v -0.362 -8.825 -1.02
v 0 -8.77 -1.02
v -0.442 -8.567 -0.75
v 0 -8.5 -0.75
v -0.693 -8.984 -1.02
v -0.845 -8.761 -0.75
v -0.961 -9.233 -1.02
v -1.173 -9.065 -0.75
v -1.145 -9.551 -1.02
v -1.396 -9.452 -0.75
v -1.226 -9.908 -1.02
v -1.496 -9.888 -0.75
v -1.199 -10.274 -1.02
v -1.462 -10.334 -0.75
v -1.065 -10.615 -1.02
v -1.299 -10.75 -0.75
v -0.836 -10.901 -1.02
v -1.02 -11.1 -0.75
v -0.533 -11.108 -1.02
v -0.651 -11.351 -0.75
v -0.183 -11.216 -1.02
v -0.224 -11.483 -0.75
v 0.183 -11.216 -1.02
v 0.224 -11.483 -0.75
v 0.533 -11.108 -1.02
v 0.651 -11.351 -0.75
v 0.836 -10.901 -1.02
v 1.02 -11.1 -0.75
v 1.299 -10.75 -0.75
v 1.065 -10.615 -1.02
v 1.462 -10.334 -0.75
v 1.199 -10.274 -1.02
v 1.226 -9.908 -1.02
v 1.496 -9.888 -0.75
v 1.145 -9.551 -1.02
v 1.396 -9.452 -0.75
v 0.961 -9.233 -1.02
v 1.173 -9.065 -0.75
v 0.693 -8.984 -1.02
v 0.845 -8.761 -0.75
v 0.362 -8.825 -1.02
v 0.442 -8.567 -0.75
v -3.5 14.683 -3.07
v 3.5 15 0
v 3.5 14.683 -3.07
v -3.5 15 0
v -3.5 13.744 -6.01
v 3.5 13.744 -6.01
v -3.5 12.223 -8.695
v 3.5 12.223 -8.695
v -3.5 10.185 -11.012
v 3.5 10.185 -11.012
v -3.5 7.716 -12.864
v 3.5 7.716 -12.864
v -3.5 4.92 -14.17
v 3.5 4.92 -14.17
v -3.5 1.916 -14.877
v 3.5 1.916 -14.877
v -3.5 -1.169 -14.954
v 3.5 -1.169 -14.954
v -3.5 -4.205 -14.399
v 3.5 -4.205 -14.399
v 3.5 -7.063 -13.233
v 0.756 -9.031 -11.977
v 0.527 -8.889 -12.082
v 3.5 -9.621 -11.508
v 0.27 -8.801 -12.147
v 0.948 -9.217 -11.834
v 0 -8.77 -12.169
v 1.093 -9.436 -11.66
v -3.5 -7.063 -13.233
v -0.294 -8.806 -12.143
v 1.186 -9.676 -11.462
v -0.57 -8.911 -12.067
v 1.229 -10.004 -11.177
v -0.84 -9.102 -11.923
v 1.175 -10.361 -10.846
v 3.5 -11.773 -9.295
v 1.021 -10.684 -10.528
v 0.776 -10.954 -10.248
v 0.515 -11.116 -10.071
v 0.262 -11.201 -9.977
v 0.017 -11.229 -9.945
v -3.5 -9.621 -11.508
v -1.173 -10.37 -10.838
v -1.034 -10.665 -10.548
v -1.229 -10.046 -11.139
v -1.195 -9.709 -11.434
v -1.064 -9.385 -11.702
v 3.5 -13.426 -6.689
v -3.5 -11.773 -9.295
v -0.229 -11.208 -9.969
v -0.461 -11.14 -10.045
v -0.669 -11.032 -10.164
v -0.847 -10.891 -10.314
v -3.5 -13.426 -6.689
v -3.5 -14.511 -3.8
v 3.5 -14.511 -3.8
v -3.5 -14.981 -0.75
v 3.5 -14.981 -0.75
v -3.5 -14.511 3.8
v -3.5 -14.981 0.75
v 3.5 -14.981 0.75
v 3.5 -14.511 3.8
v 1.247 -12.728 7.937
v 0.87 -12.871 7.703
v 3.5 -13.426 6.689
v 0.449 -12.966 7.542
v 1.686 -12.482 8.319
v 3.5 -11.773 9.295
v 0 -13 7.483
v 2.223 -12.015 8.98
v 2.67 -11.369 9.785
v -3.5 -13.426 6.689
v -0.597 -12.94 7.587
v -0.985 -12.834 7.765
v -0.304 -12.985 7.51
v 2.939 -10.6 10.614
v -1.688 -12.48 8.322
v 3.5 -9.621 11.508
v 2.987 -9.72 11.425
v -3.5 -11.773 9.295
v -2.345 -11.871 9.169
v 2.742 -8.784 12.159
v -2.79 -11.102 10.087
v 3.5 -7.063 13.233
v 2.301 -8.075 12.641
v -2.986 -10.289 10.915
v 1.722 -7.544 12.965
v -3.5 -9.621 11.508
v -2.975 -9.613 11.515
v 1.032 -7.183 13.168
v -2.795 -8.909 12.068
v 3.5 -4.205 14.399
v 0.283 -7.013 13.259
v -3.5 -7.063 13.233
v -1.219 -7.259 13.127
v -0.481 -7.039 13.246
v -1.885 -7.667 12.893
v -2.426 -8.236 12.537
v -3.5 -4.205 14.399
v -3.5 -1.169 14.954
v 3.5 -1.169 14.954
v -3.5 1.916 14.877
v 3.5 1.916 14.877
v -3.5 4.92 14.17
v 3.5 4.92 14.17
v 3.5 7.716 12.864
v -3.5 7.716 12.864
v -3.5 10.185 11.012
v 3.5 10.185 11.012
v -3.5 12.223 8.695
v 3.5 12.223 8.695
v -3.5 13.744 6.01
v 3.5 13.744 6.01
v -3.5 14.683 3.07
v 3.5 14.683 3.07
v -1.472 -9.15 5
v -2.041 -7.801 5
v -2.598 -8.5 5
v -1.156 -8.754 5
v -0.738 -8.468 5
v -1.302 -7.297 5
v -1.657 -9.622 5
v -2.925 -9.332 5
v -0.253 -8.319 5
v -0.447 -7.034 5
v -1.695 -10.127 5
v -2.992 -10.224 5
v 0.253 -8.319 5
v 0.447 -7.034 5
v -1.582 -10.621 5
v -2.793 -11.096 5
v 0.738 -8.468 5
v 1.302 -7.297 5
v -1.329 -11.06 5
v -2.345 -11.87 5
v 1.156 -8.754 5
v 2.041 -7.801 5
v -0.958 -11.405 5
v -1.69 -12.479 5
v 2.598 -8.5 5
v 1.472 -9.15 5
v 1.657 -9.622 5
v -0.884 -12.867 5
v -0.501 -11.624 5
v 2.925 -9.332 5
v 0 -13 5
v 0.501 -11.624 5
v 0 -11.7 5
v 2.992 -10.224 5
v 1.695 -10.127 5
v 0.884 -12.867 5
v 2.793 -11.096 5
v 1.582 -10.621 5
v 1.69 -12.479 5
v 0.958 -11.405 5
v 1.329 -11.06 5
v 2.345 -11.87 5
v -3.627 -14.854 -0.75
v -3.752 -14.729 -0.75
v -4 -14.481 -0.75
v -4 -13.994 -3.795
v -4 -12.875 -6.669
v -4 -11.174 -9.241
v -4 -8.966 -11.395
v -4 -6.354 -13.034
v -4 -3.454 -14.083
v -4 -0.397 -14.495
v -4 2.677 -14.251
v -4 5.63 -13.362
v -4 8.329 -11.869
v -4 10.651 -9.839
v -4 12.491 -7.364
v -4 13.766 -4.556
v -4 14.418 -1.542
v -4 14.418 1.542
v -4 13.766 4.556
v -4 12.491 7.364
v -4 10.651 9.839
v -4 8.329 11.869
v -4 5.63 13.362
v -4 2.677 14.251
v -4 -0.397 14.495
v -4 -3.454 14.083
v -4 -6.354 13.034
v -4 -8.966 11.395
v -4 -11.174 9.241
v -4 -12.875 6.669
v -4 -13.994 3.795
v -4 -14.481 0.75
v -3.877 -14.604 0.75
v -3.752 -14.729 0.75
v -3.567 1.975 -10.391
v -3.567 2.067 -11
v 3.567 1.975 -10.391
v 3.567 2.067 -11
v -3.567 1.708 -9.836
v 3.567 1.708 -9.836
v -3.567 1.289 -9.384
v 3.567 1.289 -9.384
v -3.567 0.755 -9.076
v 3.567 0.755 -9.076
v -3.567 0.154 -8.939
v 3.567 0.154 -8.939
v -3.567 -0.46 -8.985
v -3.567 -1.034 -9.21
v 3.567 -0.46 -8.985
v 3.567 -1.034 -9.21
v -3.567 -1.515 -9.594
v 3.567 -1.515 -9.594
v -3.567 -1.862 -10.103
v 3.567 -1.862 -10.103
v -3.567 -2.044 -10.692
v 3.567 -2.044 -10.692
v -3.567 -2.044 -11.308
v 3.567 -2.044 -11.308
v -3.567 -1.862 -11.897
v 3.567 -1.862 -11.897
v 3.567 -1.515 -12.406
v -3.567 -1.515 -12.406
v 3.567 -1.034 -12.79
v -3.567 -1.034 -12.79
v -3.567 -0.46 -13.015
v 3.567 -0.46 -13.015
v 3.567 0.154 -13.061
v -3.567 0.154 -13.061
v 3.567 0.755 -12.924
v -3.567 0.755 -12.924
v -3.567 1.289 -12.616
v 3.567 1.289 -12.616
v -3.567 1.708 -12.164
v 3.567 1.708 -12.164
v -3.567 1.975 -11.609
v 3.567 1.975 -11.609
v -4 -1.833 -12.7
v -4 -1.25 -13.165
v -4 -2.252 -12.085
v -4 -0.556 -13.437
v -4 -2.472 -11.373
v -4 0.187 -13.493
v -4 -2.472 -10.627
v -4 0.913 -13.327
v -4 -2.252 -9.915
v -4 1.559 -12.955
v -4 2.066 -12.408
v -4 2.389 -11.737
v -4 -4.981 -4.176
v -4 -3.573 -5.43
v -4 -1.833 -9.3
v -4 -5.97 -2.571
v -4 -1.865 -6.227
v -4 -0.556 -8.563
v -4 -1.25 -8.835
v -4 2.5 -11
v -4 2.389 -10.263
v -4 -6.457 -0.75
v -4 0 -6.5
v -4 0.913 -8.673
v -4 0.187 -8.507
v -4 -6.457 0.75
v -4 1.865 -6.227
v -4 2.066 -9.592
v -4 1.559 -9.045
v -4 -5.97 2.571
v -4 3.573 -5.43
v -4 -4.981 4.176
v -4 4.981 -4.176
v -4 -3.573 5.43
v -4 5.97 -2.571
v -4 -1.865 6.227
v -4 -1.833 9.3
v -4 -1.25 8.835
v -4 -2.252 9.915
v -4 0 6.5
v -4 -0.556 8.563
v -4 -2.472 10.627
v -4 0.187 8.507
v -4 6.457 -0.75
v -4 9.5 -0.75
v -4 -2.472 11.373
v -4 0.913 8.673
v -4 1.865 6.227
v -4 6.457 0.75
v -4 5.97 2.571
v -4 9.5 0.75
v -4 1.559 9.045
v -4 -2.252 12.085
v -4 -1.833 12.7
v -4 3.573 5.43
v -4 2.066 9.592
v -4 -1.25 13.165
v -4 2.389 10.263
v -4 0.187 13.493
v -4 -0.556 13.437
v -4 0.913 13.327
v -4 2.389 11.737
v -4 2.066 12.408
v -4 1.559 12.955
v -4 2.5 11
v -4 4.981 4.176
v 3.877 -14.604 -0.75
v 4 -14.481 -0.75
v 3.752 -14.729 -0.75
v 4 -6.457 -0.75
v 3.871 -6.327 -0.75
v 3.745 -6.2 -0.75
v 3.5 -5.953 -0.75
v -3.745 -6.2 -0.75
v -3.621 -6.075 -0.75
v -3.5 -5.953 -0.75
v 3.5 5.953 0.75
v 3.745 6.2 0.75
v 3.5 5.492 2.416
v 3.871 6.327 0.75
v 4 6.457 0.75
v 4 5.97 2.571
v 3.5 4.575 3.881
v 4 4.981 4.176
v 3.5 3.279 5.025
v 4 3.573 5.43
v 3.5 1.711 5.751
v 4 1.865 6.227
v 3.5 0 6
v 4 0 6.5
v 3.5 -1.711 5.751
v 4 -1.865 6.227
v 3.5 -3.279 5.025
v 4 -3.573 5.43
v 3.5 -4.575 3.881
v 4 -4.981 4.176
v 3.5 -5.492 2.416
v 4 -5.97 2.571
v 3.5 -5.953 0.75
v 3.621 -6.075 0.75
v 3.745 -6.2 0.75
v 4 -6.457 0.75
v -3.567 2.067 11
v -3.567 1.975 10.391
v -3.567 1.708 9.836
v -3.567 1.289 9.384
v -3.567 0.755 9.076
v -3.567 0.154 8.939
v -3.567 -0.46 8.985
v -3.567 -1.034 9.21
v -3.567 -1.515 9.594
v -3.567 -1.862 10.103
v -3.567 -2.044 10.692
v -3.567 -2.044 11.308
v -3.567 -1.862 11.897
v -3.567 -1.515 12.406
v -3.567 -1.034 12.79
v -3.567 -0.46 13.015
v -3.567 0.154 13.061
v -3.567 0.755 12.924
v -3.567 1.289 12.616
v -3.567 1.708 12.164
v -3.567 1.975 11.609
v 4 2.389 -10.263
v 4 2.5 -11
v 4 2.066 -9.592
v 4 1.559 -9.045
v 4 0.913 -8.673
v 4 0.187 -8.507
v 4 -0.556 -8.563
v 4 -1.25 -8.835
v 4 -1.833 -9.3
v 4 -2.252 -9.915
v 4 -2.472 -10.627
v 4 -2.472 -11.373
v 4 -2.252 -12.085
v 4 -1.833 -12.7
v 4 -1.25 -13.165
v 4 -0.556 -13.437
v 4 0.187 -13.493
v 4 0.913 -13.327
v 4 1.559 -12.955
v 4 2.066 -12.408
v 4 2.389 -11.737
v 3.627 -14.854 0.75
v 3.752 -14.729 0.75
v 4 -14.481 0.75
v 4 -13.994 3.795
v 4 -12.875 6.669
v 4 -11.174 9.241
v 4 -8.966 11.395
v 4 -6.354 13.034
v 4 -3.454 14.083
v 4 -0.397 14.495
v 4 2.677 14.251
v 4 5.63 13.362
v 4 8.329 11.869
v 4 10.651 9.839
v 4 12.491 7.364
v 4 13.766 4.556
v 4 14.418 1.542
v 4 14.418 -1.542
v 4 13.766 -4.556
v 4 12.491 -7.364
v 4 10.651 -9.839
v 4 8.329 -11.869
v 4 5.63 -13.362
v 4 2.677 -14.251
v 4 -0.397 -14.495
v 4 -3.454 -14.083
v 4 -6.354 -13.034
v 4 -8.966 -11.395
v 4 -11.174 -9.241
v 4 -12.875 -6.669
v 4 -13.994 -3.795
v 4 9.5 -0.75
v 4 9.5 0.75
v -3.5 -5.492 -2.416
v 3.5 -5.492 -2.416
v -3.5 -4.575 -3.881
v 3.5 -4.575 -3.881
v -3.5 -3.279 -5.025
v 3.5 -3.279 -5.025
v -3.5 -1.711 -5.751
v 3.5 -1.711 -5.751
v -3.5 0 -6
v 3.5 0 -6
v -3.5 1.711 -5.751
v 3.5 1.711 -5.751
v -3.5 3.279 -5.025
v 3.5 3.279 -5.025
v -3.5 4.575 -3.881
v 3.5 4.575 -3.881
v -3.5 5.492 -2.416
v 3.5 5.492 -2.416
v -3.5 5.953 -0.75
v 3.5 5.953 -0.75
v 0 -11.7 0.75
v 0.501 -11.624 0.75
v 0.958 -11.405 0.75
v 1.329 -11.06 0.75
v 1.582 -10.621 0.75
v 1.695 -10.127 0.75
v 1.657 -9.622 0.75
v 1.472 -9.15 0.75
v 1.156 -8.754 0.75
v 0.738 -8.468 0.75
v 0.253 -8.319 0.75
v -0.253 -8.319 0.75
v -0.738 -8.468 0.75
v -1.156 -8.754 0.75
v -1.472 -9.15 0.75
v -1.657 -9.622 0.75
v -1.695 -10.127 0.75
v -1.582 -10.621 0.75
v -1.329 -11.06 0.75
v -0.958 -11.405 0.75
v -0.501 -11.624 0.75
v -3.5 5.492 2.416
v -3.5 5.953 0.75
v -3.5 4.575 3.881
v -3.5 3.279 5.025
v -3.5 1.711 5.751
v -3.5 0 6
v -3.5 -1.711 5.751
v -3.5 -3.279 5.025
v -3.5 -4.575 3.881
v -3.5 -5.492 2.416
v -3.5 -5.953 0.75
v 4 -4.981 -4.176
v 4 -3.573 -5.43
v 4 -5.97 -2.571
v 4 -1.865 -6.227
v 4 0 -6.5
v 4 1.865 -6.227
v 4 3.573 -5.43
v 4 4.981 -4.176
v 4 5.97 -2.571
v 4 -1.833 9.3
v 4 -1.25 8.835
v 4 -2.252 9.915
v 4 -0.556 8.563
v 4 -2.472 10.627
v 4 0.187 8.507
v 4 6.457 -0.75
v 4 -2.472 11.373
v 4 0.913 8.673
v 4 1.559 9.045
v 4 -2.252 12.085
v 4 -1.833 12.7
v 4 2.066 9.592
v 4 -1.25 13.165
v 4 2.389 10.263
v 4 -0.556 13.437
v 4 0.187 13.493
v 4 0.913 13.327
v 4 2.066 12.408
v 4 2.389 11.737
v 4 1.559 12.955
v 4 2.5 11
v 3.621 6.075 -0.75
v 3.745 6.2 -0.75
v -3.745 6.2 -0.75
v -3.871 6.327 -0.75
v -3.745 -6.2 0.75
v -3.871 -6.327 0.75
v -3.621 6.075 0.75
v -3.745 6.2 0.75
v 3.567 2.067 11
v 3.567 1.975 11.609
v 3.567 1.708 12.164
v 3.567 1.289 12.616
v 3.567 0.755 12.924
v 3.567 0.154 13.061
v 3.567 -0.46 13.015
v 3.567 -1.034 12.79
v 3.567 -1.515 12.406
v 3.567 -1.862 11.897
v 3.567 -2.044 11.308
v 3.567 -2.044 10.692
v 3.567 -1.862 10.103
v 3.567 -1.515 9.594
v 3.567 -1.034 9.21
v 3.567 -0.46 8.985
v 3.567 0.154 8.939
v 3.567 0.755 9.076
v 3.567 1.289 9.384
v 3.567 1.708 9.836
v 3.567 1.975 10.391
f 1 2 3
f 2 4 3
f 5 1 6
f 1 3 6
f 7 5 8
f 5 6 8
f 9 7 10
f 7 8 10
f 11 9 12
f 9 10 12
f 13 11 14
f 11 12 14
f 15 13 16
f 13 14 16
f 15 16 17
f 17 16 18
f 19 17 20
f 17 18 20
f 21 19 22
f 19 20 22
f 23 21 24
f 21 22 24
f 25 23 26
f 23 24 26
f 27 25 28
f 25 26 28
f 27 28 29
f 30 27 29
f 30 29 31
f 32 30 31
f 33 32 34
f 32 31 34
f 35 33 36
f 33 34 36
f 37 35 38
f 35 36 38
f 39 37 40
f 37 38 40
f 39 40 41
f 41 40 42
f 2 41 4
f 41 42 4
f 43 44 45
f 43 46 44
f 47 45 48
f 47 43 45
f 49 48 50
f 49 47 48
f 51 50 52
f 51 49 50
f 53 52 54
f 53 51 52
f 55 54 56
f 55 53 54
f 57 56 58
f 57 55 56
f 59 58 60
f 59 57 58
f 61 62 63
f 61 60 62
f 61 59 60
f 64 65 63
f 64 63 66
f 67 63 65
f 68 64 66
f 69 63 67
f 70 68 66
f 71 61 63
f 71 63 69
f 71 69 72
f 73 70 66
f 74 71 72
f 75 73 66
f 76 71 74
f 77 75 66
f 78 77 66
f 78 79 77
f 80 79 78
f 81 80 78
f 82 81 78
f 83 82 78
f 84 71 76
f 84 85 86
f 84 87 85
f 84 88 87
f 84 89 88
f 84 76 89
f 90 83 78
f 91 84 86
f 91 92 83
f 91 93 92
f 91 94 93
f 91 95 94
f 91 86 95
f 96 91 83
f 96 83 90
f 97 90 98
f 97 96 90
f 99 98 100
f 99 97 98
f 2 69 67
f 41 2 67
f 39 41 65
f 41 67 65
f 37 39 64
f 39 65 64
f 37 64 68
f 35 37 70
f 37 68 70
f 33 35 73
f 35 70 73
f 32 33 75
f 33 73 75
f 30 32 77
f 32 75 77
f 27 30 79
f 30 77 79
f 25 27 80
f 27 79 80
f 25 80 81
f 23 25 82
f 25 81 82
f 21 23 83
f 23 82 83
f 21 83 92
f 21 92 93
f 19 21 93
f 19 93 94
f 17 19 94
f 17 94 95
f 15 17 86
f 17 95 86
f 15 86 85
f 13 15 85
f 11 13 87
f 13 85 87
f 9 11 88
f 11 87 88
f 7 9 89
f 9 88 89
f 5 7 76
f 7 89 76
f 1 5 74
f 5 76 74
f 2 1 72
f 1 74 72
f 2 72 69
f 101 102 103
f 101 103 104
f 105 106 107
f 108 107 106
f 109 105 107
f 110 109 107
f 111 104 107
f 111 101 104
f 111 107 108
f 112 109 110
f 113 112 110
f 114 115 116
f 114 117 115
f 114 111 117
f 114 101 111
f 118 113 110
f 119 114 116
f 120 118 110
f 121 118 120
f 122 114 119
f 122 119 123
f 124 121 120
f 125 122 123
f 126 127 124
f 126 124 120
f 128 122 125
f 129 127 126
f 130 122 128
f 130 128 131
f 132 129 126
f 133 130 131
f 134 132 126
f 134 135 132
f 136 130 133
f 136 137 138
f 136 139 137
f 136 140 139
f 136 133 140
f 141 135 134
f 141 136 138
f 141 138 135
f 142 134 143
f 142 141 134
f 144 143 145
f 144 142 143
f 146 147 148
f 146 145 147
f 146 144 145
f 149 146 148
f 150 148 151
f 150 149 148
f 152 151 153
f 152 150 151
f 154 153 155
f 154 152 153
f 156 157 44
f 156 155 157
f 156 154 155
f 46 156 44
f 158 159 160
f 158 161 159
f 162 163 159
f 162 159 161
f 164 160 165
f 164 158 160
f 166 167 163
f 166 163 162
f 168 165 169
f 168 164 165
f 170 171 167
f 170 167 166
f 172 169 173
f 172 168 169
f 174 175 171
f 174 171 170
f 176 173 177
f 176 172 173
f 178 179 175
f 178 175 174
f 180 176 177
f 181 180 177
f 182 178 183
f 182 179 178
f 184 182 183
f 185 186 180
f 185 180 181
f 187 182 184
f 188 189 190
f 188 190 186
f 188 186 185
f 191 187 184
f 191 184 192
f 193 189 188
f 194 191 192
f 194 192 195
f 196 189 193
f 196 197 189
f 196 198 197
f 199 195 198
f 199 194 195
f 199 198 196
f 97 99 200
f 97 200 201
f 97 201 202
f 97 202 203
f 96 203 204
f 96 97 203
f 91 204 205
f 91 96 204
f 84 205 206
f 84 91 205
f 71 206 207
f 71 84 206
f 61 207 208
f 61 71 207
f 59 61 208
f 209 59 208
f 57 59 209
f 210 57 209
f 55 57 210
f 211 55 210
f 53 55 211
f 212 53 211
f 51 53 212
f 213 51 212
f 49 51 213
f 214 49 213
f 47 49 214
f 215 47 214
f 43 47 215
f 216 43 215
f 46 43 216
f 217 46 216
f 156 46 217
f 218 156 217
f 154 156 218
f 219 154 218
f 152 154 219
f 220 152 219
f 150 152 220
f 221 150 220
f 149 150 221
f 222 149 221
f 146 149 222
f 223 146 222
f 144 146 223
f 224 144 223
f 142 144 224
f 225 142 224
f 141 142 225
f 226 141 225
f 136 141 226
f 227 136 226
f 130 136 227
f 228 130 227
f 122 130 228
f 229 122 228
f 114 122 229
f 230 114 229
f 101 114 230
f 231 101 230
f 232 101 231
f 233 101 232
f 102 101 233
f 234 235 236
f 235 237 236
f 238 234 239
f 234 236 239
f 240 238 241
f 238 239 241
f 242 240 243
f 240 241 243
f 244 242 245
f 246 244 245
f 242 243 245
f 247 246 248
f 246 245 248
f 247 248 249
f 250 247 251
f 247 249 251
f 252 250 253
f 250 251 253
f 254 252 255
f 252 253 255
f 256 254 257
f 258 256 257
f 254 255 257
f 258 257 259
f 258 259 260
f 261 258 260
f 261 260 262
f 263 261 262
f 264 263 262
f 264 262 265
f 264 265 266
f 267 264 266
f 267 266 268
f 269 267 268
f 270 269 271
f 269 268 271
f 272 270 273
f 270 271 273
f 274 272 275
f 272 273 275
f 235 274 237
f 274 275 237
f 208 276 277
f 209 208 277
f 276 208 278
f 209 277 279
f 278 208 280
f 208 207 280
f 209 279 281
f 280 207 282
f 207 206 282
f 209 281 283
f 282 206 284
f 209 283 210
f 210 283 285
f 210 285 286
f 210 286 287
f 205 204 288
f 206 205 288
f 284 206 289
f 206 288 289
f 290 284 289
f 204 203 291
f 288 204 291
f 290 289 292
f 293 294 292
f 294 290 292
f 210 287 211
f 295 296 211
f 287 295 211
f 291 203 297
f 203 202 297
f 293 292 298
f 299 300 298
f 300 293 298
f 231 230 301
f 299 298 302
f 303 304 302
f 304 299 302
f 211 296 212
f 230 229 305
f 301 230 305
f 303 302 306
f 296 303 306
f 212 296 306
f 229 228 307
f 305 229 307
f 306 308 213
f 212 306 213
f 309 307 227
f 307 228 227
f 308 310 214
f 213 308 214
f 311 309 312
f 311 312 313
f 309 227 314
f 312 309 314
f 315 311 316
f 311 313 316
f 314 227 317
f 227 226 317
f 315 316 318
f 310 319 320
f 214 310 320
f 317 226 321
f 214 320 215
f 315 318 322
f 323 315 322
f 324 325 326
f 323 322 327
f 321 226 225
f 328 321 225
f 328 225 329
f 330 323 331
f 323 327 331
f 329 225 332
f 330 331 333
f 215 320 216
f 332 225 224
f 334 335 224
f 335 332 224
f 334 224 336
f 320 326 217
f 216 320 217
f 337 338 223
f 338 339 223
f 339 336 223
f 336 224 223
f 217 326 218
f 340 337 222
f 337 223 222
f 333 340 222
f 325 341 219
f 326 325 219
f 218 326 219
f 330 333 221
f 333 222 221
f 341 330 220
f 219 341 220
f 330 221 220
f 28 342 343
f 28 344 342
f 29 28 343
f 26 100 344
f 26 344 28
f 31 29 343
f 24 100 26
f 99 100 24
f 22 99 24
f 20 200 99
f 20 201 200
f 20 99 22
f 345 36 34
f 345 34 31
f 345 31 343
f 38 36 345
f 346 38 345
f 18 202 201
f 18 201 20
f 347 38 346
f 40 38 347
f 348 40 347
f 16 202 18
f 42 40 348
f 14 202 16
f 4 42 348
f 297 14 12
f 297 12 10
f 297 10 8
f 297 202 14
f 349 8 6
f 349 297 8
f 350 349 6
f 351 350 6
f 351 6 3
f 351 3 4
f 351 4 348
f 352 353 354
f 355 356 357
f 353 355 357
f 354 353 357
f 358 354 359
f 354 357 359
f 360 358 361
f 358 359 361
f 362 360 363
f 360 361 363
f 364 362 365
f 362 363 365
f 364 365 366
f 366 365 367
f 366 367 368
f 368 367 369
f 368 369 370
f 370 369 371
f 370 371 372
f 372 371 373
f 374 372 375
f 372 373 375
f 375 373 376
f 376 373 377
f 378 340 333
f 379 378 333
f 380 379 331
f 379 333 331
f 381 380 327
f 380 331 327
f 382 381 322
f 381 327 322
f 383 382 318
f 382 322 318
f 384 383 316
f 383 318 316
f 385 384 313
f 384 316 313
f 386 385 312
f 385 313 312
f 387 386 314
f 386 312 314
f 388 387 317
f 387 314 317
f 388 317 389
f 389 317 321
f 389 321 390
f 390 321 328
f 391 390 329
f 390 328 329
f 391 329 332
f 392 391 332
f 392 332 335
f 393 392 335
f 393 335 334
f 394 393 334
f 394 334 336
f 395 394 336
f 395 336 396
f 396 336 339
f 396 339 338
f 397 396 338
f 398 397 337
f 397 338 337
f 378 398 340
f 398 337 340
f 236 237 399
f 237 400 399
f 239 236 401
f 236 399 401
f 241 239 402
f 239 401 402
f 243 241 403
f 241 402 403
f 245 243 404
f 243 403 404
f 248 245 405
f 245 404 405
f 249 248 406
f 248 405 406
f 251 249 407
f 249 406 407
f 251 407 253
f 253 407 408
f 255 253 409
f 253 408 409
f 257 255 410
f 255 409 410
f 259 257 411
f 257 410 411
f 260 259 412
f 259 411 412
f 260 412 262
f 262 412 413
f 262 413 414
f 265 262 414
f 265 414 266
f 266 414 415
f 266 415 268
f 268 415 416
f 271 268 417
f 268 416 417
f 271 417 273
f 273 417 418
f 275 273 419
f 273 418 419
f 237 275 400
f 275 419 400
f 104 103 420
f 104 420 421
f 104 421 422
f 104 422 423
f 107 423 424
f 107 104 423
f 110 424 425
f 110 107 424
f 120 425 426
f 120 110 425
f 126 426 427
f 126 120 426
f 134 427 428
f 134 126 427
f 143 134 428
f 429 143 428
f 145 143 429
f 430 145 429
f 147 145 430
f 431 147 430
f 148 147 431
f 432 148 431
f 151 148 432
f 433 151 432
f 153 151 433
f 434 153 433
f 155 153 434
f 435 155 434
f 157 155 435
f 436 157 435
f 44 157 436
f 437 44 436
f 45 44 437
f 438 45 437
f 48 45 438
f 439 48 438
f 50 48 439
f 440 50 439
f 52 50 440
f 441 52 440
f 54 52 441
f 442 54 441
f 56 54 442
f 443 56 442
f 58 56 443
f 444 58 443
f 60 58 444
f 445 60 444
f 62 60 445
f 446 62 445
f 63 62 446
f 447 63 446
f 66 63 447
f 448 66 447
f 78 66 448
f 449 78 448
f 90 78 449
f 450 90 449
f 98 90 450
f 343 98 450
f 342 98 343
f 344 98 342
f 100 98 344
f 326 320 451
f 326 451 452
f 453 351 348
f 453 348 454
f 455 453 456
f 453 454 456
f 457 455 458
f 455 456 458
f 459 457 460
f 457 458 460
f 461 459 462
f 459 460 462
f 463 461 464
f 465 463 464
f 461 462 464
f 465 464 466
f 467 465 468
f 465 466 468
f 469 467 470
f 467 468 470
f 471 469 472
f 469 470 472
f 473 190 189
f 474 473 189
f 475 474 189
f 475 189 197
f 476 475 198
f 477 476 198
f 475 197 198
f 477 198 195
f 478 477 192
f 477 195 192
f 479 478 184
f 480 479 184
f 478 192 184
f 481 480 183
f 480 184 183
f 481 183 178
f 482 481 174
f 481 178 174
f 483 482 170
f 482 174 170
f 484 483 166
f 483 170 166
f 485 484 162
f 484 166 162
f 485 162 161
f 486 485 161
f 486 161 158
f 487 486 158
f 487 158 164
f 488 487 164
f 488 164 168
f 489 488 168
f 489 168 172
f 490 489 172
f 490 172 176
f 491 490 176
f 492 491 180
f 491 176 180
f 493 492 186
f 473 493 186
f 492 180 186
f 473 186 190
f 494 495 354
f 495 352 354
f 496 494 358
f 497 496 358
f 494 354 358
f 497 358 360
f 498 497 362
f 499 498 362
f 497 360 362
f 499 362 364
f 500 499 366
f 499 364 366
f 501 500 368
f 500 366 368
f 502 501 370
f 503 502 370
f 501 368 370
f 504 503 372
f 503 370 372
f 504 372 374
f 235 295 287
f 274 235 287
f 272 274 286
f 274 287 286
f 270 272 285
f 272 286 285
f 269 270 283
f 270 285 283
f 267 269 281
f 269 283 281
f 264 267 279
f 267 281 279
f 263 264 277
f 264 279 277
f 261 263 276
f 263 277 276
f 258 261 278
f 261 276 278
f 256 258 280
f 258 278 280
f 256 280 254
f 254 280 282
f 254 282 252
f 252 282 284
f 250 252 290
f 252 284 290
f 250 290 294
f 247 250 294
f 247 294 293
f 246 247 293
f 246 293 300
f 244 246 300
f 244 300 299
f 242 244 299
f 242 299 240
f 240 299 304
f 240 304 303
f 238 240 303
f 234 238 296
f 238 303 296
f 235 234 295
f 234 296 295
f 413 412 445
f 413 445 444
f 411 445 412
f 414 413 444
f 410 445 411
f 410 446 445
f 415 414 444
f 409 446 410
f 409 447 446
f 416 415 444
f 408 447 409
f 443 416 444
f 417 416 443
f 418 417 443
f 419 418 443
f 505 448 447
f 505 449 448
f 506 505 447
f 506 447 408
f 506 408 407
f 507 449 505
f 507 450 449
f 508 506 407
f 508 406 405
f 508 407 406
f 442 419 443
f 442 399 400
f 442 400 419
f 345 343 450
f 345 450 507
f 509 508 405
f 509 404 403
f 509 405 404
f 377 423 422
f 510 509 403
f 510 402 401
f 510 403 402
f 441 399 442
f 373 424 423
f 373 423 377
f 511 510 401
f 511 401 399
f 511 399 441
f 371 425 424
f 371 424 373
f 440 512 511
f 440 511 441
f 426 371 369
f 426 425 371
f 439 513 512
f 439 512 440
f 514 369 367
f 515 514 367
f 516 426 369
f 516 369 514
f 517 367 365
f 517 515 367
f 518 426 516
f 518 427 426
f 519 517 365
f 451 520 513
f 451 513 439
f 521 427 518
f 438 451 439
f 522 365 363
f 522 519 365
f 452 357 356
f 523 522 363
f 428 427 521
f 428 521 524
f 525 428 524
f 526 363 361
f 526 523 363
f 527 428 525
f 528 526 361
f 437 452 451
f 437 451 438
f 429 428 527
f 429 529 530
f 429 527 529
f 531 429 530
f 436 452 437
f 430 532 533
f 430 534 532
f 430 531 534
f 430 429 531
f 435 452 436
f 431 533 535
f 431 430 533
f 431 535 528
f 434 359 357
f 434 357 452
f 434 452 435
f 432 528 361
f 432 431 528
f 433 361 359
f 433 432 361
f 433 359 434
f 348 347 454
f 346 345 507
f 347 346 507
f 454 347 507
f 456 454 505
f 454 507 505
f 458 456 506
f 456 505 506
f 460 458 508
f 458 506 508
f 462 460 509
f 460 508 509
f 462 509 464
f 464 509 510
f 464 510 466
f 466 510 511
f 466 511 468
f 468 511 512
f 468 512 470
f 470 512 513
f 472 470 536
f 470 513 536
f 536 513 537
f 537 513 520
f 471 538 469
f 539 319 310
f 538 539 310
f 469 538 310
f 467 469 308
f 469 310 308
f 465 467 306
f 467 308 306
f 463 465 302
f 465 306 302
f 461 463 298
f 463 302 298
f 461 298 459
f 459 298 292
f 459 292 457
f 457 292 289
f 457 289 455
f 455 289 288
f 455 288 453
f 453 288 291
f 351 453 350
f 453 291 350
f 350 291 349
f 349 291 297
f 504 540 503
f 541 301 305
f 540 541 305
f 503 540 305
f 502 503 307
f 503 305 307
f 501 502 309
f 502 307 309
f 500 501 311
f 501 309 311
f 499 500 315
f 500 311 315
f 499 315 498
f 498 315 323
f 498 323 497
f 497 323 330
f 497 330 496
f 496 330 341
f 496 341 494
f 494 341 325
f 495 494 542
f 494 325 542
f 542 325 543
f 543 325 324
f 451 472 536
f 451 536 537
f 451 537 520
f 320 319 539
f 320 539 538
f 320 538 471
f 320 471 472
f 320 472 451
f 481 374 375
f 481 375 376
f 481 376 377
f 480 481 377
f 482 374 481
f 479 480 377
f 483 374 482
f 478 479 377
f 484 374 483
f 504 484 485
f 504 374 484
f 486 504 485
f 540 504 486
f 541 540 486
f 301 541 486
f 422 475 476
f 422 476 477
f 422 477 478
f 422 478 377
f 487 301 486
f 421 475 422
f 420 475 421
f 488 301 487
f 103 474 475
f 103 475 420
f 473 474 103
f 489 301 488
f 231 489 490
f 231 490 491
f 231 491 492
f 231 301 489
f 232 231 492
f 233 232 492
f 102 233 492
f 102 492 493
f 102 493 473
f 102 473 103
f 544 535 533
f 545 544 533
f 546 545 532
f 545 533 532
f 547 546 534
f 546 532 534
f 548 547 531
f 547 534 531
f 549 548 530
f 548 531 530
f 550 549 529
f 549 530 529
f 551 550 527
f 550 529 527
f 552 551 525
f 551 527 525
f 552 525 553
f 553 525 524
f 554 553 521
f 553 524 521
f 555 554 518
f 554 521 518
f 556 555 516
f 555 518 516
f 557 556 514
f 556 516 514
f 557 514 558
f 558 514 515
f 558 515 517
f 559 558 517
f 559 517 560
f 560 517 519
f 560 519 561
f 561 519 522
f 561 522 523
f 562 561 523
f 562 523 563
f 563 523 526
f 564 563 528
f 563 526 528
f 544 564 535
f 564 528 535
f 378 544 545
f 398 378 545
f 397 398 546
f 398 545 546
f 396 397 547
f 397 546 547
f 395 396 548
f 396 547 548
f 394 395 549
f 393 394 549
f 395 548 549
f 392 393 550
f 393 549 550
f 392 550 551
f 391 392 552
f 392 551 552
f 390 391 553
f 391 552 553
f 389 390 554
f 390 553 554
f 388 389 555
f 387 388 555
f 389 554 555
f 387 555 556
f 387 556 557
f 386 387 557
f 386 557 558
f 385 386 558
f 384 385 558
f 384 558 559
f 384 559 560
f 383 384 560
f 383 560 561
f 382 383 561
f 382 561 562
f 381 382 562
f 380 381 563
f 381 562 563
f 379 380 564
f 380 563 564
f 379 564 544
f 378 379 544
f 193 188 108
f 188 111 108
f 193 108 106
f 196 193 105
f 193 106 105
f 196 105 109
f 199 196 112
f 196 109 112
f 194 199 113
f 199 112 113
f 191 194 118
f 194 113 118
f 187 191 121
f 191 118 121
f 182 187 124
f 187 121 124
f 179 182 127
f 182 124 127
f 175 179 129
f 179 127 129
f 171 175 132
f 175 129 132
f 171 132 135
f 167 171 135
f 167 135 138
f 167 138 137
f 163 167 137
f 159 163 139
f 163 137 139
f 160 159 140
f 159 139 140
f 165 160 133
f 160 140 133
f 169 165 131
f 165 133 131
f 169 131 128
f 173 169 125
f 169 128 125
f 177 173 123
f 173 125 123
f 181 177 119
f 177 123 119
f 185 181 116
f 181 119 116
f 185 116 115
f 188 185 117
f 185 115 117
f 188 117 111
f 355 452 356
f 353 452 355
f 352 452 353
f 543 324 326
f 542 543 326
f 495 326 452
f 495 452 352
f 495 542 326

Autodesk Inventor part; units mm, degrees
sketch "Sketch_1" plane through (0, 0, 0) normal (0, 0, 1) x (1, 0, 0)
  line L0 (4, 0) -> (-4, 0)
  line L1 (-4, 14.5) -> (-4, 6.5)
  line L2 (-4, 6.5) -> (-3.5, 6)
  line L3 (-3.5, 6) -> (3.5, 6)
  line L4 (3.5, 6) -> (4, 6.5)
  line L5 (4, 6.5) -> (4, 14.5)
  line L6 (4, 14.5) -> (3.5, 15)
  line L7 (3.5, 15) -> (-3.5, 15)
  line L8 (-3.5, 15) -> (-4, 14.5)
revolve "Revolution1" add sketch "Sketch_1" angle 360 about axis through (4, 0, 0) along (1, 0, 0)
sketch "Sketch_2" plane through (0, 0, 0) normal (1, 0, 0) x (0, 1, 0)
  line L0 (-15, 0.75) -> (-15, -0.75)
  line L1 (-15, -0.75) -> (9.5, -0.75)
  line L2 (9.5, -0.75) -> (9.5, 0.75)
  line L3 (9.5, 0.75) -> (-15, 0.75)
extrude "Extrusion1" cut sketch "Sketch_2" along normal mid plane 8
sketch "Sketch_3" plane through (0, 0, 0) normal (1, 0, 0) x (0, 1, 0)
  line L0 (-10, 15) -> (-10, 0)
  line L1 (-10, 0) -> (-11.7, 0)
  line L2 (-11.7, 0) -> (-11.7, 5)
  line L3 (-11.7, 5) -> (-13, 5)
  line L4 (-13, 5) -> (-13, 15)
  line L5 (-13, 15) -> (-10, 15)
  line L6 (-10, 15) -> (-10, 0)
revolve "Revolution2" cut sketch "Sketch_3" angle 360 about axis through (0, -10, 15) along (0, 0, 1)
sketch "Sketch_4" plane through (0, 0, 0) normal (1, 0, 0) x (0, 1, 0)
  line L0 (-10, -15.75) -> (-10, -0.75)
  line L1 (-10, -0.75) -> (-8.5, -0.75)
  line L2 (-8.5, -0.75) -> (-8.7705, -1.0205)
  line L3 (-8.7705, -1.0205) -> (-8.7705, -15.75)
  line L4 (-8.7705, -15.75) -> (-10, -15.75)
  line L5 (-10, -15.75) -> (-10, -0.75)
revolve "Revolution3" cut sketch "Sketch_4" angle 360 about axis through (0, -10, -15.75) along (0, 0, -1)
thread "Thread1" size "M3x0.5" class "6H" standard "ISO Metric profile" length 11.3387
sketch "Sketch_7" plane through (0, 0, -11) normal (0, 0, 1) x (1, 0, 0)
  line L0 (4, 0) -> (-4, 0)
  line L1 (-4, 0) -> (-4, 2.5)
  line L2 (-4, 2.5) -> (-3.567, 2.067)
  line L3 (-3.567, 2.067) -> (3.567, 2.067)
  line L4 (3.567, 2.067) -> (4, 2.5)
  line L5 (4, 2.5) -> (4, 0)
  line L6 (4, 0) -> (-4, 0)
revolve "Revolution4" cut sketch "Sketch_7" angle 360 about axis through (4, 0, -11) along (1, 0, 0)
thread "Thread2" size "M5x0.8" class "6H" standard "ISO Metric profile" full length
sketch "Sketch_8" plane through (0, 0, 11) normal (0, 0, 1) x (1, 0, 0)
  line L0 (4, 0) -> (-4, 0)
  line L1 (-4, 0) -> (-4, 2.5)
  line L2 (-4, 2.5) -> (-3.567, 2.067)
  line L3 (-3.567, 2.067) -> (3.567, 2.067)
  line L4 (3.567, 2.067) -> (4, 2.5)
  line L5 (4, 2.5) -> (4, 0)
  line L6 (4, 0) -> (-4, 0)
revolve "Revolution5" cut sketch "Sketch_8" angle 360 about axis through (4, 0, 11) along (1, 0, 0)
thread "Thread3" size "M5x0.8" class "6H" standard "ISO Metric profile" full length
ref_plane "body_screw_XY" through (0, -10, 5) normal (0, 0, 1) x (1, 0, 0)
ref_plane "body_screw_YZ" through (0, -10, 5) normal (1, 0, 0) x (0, 1, 0)
ref_plane "body_screw_ZX" through (0, -10, 5) normal (0, 1, 0) x (0, 0, 1)
properties part number "SCSW12-8b"
